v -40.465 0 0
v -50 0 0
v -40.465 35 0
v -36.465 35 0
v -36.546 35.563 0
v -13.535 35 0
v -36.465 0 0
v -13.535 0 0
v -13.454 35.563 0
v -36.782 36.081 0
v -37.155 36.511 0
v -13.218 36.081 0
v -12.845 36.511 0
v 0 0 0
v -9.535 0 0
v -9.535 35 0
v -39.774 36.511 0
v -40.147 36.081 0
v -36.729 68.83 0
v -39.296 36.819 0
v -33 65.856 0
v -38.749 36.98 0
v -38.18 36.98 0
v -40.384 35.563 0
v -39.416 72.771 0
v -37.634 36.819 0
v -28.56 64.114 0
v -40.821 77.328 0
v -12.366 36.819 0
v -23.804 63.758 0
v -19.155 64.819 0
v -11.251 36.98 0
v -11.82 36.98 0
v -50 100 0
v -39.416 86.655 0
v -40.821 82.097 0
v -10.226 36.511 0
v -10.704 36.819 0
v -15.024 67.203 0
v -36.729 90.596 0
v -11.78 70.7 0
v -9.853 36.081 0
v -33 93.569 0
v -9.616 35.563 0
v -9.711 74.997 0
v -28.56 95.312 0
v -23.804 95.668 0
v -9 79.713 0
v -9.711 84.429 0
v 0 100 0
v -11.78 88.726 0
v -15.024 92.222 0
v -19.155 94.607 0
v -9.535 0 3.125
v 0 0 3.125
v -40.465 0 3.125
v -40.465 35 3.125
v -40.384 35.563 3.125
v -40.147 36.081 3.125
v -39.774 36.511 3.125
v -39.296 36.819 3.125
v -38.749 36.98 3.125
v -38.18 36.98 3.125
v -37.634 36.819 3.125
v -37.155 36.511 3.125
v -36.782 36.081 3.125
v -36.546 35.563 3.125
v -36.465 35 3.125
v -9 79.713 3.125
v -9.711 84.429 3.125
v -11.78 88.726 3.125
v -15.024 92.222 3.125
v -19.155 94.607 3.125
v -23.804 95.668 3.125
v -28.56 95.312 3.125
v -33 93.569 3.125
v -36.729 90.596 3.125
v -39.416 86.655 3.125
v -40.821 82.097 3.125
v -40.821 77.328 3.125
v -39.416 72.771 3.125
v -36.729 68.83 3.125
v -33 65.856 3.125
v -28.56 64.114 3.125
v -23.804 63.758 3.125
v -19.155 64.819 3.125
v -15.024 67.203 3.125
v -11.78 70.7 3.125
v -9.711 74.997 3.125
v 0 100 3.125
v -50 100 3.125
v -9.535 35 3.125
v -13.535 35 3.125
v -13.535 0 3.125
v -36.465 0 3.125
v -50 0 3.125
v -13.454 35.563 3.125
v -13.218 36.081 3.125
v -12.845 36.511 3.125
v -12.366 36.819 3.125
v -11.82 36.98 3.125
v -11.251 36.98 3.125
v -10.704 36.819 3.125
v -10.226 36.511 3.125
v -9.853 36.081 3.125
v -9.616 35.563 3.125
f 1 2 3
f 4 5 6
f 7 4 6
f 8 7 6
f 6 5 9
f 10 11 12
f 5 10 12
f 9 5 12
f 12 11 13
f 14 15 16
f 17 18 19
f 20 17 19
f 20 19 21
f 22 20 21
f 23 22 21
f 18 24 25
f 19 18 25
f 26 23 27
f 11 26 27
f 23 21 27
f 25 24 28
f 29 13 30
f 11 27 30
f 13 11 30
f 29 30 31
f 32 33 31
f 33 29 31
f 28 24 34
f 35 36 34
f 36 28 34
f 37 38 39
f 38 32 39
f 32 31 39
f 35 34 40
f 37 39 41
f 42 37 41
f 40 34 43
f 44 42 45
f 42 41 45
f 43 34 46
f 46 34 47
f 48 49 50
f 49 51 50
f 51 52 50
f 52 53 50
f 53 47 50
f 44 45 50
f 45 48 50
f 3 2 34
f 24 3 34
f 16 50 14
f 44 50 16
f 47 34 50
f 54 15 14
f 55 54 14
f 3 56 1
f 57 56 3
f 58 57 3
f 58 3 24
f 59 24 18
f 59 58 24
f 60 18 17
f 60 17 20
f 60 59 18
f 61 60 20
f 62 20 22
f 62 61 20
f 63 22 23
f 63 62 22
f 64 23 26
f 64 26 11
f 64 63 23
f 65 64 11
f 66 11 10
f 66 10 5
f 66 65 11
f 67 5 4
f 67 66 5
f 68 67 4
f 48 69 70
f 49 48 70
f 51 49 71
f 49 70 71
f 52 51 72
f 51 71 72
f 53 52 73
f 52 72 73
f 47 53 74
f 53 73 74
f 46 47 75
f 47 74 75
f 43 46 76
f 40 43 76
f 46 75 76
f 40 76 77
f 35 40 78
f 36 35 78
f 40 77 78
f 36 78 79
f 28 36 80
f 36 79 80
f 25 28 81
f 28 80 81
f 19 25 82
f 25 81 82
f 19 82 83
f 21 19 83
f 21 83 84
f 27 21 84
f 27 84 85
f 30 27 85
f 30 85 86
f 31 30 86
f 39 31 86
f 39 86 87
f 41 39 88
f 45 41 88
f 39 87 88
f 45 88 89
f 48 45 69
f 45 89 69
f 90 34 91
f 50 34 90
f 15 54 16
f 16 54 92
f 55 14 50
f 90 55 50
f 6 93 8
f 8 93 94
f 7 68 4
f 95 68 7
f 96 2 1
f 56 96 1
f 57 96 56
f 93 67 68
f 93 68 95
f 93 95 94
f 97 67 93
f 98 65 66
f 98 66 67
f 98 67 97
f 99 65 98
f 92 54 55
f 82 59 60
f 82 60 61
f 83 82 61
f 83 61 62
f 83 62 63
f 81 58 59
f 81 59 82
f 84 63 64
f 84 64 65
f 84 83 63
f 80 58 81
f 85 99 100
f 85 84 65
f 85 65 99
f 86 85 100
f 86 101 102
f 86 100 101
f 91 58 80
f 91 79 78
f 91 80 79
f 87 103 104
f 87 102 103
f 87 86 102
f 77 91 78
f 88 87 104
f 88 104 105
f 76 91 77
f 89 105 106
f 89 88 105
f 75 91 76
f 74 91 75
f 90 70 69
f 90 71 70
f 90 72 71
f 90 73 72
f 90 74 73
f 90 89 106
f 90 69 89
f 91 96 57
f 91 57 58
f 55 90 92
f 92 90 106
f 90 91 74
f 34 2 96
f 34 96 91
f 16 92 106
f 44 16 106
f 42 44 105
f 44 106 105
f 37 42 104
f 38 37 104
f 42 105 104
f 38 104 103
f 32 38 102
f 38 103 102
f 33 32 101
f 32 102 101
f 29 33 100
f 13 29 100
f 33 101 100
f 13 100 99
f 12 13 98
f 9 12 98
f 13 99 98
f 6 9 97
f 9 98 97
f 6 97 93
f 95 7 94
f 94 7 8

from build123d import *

# Parameters (mm, degrees)
ESBO_O1_W                = 50
ESBO_O1_H                = 100
RESSALTO_EXTRUS_O1_DEPTH = 3.125
ESBO_O2_R                = 16
CORTE_EXTRUS_O1_DEPTH    = 3.125


with BuildPart() as part:
    # Esboço1 → Ressalto-extrusão1 (new body)
    with BuildSketch(Plane.XY):
        with Locations((-25, 50)):
            Rectangle(ESBO_O1_W, ESBO_O1_H)
    extrude(amount=RESSALTO_EXTRUS_O1_DEPTH)

    # Esboço2 → Corte-extrusão1 (cut)
    with BuildSketch(Plane.XY.offset(3.125)):
        with Locations((-25, 79.712786513)):
            Circle(ESBO_O2_R)
        with BuildLine():
            Line((-36.464726097, 35), (-36.464726097, 0))
            Line((-36.464726097, 0), (-40.464726097, 0))
            Line((-40.464726097, 0), (-40.464726097, 35))
            ThreePointArc((-40.464726097, 35), (-38.464726097, 37), (-36.464726097, 35))
        make_face()
        with BuildLine():
            Line((-13.535273903, 35), (-13.535273903, 0))
            Line((-13.535273903, 0), (-9.535273903, 0))
            Line((-9.535273903, 0), (-9.535273903, 35))
            ThreePointArc((-9.535273903, 35), (-11.535273903, 37), (-13.535273903, 35))
        make_face()
    extrude(amount=-CORTE_EXTRUS_O1_DEPTH, mode=Mode.SUBTRACT)


solid = part.part
